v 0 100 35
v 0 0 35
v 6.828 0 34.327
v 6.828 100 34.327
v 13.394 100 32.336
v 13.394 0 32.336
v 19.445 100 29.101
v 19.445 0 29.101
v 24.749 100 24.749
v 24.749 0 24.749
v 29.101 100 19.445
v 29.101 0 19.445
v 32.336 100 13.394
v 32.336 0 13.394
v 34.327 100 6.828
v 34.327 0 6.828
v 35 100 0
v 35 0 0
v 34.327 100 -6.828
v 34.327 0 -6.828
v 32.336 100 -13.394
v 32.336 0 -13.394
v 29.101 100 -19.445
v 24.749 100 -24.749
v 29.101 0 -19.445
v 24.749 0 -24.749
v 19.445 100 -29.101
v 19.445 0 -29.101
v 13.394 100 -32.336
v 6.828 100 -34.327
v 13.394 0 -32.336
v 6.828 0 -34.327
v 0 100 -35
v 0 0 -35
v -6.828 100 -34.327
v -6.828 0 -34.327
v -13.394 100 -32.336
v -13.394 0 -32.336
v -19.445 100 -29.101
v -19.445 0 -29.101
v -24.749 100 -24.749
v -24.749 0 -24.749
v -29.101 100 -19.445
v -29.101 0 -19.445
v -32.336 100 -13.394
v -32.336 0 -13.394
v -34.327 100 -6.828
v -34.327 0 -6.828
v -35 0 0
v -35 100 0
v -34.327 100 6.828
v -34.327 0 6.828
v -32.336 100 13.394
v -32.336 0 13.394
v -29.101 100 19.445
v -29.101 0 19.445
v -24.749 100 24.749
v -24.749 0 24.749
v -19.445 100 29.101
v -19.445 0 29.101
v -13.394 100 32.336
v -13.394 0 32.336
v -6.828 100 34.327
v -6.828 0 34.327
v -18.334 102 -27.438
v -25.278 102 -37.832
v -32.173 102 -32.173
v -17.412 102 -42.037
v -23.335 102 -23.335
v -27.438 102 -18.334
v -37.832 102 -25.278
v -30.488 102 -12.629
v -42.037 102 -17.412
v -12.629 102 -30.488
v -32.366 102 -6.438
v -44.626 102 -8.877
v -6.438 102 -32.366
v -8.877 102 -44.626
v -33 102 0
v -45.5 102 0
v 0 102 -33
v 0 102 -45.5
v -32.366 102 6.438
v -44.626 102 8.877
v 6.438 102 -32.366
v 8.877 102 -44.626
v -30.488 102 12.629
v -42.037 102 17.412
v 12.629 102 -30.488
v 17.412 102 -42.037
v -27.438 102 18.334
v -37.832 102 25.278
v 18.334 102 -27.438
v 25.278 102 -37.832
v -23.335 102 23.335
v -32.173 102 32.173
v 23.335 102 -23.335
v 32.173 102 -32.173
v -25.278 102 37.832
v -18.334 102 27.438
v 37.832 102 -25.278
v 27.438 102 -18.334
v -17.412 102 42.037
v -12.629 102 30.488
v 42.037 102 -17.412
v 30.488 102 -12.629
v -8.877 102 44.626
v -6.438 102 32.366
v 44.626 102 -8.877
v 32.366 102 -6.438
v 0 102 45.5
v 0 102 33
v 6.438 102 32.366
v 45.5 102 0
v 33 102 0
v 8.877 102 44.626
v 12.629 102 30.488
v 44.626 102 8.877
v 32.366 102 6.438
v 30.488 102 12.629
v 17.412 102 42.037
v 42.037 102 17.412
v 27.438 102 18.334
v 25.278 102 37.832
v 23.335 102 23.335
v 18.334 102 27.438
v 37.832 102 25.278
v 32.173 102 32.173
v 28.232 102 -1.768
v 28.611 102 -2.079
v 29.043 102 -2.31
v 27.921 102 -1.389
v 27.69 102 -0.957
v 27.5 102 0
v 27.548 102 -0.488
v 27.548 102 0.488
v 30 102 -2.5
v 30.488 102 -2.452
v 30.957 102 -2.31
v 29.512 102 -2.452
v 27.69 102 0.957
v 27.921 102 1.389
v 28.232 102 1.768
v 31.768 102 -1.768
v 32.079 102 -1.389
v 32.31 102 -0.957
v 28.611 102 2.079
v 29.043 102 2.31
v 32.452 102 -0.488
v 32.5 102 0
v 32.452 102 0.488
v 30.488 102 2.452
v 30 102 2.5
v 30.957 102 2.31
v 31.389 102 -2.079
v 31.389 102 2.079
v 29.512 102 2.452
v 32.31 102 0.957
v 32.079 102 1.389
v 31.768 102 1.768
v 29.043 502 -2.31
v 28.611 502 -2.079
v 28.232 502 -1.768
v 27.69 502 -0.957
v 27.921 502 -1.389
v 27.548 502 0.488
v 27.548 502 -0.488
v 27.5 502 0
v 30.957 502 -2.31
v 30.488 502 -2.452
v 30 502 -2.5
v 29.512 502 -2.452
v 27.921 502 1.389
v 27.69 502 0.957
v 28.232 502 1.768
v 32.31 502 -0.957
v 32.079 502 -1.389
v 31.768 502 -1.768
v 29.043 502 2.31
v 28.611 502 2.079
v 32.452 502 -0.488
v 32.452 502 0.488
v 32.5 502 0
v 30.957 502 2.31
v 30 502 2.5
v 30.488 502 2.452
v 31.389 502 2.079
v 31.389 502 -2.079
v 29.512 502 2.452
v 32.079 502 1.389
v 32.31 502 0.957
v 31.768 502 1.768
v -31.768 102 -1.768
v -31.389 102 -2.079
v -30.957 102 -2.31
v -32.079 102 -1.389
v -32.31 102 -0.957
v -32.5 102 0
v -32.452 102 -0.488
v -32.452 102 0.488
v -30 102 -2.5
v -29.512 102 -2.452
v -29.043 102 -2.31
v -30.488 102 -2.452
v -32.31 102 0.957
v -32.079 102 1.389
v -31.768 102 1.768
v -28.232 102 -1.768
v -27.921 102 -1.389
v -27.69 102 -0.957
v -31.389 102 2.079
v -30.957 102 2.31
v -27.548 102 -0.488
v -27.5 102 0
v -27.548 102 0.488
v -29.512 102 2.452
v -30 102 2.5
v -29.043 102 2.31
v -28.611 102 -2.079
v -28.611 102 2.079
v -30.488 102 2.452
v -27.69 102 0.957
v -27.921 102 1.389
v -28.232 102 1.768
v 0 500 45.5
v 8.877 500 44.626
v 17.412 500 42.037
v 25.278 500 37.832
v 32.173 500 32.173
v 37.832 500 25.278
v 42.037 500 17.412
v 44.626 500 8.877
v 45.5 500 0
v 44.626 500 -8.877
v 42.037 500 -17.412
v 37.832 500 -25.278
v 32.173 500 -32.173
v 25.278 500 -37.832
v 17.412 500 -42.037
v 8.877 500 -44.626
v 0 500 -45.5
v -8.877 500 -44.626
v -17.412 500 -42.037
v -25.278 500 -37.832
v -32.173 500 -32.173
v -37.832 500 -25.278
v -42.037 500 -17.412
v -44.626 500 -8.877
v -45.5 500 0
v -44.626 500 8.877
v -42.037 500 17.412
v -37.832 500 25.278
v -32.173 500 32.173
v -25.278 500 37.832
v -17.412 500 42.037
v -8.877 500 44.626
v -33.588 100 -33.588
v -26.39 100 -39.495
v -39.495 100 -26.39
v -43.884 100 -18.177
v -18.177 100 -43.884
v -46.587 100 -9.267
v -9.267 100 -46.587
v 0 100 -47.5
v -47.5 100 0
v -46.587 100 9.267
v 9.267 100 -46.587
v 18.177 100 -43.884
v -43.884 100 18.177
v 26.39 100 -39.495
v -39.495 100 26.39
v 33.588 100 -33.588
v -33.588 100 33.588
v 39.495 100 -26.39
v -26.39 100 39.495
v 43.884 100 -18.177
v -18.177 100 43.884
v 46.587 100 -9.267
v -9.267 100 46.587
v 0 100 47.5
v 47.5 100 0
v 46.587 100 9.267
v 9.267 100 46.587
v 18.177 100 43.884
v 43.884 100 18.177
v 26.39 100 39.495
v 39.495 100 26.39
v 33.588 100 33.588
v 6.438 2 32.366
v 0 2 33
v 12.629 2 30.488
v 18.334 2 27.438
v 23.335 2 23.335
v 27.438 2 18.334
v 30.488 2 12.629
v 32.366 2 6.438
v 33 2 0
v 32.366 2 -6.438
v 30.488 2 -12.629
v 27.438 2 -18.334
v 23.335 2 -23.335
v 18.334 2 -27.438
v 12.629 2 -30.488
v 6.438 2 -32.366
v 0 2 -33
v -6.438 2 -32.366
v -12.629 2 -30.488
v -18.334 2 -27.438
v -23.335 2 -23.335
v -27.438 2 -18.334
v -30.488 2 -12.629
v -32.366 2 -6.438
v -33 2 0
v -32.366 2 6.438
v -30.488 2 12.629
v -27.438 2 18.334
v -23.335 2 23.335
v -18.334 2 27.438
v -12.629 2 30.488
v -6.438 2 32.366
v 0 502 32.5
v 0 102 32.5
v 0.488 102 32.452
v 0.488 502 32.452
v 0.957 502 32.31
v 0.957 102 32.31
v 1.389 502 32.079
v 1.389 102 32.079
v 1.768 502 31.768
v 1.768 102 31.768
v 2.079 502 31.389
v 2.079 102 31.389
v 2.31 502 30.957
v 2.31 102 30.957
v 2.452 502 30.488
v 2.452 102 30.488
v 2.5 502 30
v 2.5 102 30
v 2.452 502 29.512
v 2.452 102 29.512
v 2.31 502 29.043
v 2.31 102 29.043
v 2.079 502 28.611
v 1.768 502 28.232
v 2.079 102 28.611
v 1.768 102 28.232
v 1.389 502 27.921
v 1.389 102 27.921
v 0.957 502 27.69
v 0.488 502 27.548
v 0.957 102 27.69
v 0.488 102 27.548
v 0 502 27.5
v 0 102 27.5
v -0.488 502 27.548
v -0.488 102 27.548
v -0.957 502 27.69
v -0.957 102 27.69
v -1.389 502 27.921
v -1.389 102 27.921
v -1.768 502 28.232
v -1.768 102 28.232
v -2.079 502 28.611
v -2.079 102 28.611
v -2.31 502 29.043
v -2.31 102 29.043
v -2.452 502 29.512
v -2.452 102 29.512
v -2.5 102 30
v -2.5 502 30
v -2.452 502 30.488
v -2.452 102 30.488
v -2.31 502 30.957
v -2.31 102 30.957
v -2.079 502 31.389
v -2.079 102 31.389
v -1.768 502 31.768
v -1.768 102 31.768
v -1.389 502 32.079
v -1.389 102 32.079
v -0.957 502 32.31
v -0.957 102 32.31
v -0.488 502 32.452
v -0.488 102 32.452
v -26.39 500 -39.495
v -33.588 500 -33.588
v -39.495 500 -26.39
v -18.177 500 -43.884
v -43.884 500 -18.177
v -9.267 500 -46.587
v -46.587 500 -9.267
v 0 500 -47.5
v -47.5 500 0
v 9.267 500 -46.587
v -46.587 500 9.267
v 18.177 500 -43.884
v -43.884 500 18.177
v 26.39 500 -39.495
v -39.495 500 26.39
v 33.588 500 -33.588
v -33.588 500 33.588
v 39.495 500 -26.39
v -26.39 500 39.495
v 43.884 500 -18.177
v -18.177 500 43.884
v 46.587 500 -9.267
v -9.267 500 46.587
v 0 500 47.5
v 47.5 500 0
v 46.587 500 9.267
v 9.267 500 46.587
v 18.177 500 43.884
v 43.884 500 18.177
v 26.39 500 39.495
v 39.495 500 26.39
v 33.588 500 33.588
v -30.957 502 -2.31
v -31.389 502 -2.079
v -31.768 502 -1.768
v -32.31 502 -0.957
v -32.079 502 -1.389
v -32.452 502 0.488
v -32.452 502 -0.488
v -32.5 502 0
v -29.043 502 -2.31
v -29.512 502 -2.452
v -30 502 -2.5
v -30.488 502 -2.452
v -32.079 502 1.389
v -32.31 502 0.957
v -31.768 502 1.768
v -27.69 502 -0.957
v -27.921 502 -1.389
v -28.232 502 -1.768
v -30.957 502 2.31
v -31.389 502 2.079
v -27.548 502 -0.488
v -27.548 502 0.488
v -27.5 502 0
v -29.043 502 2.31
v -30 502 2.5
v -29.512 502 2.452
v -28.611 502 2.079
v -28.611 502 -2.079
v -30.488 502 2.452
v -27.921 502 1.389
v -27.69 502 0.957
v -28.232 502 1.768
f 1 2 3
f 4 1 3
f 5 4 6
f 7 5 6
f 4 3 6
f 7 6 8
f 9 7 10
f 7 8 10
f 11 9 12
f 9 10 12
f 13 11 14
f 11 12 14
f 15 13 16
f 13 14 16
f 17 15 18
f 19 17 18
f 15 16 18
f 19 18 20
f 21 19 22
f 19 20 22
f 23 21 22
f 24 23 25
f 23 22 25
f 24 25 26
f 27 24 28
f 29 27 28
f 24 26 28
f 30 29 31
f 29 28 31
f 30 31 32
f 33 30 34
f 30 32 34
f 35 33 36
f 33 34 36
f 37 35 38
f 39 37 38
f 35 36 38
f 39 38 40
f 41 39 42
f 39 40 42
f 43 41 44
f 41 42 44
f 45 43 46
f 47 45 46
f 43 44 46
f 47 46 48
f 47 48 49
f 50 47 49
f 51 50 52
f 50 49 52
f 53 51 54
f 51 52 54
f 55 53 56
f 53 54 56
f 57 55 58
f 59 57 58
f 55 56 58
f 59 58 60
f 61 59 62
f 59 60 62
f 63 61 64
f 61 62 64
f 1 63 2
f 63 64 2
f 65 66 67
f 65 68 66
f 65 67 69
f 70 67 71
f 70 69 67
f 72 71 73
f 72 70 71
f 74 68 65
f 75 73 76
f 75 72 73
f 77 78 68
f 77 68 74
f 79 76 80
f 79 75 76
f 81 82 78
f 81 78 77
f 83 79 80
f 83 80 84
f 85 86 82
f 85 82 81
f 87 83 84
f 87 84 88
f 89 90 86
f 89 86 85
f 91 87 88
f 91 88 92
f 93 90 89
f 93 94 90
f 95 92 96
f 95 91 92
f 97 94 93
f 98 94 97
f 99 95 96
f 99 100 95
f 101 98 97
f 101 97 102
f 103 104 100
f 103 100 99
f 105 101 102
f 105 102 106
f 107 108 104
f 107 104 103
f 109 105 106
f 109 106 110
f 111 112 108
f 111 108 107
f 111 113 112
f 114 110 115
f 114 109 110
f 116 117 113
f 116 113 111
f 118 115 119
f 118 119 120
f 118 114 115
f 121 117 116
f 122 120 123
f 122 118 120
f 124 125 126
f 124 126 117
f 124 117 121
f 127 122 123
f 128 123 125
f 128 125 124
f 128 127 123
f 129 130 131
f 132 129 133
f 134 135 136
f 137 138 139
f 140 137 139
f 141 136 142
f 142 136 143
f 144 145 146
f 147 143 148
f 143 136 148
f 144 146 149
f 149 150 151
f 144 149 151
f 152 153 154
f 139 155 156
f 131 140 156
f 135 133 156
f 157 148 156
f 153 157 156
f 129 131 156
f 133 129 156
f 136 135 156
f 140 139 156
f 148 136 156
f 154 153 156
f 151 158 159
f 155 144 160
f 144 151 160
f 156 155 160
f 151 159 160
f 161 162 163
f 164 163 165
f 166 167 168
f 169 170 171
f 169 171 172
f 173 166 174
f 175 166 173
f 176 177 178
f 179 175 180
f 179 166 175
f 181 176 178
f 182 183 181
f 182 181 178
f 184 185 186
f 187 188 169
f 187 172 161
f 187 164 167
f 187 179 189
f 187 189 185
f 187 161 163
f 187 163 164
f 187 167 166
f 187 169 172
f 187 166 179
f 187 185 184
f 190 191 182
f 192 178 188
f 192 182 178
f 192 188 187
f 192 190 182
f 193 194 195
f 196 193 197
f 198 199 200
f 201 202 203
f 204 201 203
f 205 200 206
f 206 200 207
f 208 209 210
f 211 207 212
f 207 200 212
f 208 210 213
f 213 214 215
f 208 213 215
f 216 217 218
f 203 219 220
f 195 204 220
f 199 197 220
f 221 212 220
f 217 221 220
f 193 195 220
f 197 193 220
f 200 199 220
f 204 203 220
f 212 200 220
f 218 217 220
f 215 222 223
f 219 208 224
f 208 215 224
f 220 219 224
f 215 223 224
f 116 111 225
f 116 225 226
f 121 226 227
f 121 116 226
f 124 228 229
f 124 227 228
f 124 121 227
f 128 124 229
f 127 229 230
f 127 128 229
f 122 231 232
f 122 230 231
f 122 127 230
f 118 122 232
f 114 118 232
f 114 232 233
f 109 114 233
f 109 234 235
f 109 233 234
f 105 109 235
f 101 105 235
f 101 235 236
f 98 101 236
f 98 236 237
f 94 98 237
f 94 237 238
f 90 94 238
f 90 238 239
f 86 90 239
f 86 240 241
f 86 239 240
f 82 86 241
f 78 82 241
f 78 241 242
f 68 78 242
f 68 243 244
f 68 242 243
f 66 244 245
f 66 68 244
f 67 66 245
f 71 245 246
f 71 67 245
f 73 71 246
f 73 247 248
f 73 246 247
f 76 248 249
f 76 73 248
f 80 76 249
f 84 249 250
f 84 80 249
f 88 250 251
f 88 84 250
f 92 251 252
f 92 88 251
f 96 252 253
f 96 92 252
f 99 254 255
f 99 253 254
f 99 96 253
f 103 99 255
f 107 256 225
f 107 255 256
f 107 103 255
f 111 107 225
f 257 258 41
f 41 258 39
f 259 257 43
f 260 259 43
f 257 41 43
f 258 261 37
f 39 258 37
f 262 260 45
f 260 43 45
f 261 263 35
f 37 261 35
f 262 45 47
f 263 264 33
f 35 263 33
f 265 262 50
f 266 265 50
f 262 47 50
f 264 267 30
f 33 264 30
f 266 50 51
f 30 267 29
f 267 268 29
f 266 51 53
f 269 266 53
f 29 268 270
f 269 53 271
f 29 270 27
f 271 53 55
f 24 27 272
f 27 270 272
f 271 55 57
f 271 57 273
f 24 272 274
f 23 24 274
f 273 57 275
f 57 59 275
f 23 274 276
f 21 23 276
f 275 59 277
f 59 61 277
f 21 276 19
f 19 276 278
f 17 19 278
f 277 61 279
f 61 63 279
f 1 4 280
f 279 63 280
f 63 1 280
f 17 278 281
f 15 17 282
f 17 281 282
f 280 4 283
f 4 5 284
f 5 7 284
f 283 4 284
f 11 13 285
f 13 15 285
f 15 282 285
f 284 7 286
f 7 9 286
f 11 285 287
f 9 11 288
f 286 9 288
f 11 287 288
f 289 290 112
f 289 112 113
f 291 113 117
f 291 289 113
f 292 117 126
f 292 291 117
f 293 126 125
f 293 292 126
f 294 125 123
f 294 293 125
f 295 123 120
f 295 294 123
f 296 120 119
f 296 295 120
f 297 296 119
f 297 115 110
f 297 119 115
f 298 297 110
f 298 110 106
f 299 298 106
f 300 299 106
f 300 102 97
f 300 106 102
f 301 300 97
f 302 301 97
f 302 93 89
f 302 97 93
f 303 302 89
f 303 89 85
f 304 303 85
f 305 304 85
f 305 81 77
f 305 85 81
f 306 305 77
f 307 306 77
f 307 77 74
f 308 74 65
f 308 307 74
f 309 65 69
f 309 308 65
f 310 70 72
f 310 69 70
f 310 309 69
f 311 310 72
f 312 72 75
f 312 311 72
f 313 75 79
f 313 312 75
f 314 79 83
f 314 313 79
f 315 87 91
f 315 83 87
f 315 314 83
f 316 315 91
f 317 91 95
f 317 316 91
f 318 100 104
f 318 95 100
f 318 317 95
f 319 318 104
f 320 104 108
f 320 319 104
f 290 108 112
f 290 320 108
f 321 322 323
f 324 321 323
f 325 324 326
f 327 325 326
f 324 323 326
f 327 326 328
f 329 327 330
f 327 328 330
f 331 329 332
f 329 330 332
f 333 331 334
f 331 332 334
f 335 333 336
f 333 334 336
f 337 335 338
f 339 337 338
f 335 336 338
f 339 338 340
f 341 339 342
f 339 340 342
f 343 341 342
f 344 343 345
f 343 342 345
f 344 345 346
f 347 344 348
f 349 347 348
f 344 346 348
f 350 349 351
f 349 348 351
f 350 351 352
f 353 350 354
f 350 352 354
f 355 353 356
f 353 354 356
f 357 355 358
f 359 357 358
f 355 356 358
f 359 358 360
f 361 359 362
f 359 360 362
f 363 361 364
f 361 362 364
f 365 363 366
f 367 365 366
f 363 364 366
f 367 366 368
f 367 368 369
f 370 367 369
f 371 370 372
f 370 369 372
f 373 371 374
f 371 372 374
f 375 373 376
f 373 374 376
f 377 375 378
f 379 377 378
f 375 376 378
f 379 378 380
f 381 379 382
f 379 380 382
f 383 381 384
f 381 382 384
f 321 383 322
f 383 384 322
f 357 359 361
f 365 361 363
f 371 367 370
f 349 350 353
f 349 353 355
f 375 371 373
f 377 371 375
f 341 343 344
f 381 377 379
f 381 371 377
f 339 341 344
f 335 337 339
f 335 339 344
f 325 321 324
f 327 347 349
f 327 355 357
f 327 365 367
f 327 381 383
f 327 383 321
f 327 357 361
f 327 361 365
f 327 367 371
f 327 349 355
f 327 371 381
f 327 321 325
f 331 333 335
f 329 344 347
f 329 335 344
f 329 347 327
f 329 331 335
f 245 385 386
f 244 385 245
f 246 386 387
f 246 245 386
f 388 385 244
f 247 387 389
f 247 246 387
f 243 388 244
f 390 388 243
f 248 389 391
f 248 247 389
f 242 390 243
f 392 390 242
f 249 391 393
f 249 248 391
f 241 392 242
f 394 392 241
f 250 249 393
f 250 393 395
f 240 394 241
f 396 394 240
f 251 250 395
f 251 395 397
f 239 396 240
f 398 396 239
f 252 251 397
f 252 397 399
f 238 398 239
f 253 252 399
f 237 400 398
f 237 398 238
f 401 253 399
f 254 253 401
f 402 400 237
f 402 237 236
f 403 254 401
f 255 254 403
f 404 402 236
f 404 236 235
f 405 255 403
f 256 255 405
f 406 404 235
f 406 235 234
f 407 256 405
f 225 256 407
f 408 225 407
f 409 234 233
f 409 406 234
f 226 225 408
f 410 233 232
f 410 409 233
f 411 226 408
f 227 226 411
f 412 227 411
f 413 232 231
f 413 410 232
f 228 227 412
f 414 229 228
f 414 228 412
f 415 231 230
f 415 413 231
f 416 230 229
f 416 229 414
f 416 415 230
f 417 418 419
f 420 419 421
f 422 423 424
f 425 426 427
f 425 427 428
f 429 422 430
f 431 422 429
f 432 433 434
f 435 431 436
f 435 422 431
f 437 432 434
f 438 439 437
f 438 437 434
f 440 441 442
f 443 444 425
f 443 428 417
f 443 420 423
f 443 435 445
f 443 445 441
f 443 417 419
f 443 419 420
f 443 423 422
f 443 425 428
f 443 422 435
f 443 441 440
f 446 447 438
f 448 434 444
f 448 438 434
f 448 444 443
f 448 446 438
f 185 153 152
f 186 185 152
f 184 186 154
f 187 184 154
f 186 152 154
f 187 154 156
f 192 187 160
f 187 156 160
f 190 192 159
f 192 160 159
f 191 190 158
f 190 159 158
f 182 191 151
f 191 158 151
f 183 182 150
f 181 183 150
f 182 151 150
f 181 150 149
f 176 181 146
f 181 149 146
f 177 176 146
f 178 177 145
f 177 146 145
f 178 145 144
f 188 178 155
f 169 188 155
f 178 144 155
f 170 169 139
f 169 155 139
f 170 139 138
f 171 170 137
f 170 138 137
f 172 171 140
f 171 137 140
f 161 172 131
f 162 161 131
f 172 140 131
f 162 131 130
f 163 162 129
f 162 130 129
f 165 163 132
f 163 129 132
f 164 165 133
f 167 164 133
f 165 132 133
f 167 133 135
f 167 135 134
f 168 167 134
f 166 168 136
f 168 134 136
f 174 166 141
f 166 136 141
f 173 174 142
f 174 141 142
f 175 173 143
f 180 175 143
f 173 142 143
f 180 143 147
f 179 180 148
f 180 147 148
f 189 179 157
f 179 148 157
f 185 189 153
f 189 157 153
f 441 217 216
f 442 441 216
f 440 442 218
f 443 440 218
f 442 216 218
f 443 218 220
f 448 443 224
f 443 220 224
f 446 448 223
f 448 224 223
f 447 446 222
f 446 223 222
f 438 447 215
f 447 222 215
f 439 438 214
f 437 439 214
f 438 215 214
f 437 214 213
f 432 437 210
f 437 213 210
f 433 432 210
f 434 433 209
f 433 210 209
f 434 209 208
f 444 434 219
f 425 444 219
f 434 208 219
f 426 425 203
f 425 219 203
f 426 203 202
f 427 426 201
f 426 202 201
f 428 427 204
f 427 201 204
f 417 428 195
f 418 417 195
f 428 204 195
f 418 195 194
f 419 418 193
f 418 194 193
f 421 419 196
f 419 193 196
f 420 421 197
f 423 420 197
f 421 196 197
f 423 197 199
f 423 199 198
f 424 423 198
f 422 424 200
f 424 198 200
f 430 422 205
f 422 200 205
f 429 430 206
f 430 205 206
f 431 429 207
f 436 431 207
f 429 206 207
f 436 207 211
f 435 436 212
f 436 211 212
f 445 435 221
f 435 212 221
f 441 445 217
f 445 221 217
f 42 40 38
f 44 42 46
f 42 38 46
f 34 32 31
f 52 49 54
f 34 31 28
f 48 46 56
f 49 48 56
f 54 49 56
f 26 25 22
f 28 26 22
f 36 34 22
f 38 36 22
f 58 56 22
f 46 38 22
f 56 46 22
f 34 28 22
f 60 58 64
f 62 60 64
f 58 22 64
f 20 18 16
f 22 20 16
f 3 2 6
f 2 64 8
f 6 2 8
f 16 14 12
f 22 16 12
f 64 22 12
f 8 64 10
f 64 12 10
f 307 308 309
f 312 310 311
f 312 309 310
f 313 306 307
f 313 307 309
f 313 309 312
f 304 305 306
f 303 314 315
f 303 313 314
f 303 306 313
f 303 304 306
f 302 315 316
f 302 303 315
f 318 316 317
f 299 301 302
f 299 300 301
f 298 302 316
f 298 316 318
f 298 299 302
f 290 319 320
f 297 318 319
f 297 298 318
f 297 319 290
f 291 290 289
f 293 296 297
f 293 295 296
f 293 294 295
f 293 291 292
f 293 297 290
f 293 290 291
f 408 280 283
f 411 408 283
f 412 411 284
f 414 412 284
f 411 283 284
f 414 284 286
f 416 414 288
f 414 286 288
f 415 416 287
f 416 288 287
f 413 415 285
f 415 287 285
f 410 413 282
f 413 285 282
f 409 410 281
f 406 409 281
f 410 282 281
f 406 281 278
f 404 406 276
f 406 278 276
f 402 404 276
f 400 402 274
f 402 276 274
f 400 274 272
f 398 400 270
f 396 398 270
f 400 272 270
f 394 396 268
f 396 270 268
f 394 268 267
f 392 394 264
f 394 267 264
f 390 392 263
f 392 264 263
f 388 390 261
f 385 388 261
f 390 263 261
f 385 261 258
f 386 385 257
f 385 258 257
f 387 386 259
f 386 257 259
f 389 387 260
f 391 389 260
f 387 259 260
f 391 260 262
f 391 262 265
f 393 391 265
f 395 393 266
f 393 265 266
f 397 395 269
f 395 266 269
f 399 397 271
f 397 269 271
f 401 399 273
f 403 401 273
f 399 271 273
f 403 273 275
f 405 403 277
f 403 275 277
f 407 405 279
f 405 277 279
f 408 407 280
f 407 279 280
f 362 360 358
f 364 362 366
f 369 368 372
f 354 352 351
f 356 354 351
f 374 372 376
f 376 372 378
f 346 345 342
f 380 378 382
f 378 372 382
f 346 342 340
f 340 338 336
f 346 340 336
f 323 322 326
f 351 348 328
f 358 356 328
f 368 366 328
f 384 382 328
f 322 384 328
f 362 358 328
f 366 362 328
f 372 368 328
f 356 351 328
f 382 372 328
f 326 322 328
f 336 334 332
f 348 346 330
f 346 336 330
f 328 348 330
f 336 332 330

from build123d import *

# Parameters (mm, degrees)
SKETCH1_R             = 35
BOSS_EXTRUDE1_DEPTH   = 100
SKETCH2_R             = 47.5
BOSS_EXTRUDE2_DEPTH   = 400
SHELL1_T              = -2
SKETCH3_R             = 2.5
BOSS_EXTRUDE3_DEPTH   = 400
BOSS_EXTRUDE3_2_DEPTH = 400
BOSS_EXTRUDE3_3_DEPTH = 400


with BuildPart() as part:
    # Sketch1 → Boss-Extrude1 (new body)
    with BuildSketch(Plane(origin=(0, 0, 0), x_dir=(1, 0, 0), z_dir=(0, 1, 0))):
        with Locations(Location((0, 0, 0), (0, 0, 270))):
            Circle(SKETCH1_R)
    extrude(amount=BOSS_EXTRUDE1_DEPTH)

    # Sketch2 → Boss-Extrude2 (add)
    with BuildSketch(Plane(origin=(0, 100, 0), x_dir=(1, 0, 0), z_dir=(0, 1, 0))):
        with Locations(Location((0, 0, 0), (0, 0, 270))):
            Circle(SKETCH2_R)
    extrude(amount=BOSS_EXTRUDE2_DEPTH)

    # Shell1
    shell1_openings = [part.faces().sort_by_distance(p)[0] for p in [
        (0, 500, 0),
    ]]
    offset(amount=SHELL1_T, openings=shell1_openings, kind=Kind.INTERSECTION)


with BuildPart() as body_2:
    # Sketch3 → Boss-Extrude3 (new body)
    with BuildSketch(Plane(origin=(0, 102, 0), x_dir=(1, 0, 0), z_dir=(0, 1, 0))):
        with Locations(Location((0, -30, 0), (0, 0, 270))):
            Circle(SKETCH3_R)
    extrude(amount=BOSS_EXTRUDE3_DEPTH)


with BuildPart() as body_3:
    # Sketch3 → Boss-Extrude3 2 (new body)
    with BuildSketch(Plane(origin=(0, 102, 0), x_dir=(1, 0, 0), z_dir=(0, 1, 0))):
        with Locations(Location((-30, 0, 0), (0, 0, 270))):
            Circle(SKETCH3_R)
    extrude(amount=BOSS_EXTRUDE3_2_DEPTH)


with BuildPart() as body_4:
    # Sketch3 → Boss-Extrude3 3 (new body)
    with BuildSketch(Plane(origin=(0, 102, 0), x_dir=(1, 0, 0), z_dir=(0, 1, 0))):
        with Locations(Location((30, 0, 0), (0, 0, 270))):
            Circle(SKETCH3_R)
    extrude(amount=BOSS_EXTRUDE3_3_DEPTH)


solid = Compound([part.part, body_2.part, body_3.part, body_4.part])
